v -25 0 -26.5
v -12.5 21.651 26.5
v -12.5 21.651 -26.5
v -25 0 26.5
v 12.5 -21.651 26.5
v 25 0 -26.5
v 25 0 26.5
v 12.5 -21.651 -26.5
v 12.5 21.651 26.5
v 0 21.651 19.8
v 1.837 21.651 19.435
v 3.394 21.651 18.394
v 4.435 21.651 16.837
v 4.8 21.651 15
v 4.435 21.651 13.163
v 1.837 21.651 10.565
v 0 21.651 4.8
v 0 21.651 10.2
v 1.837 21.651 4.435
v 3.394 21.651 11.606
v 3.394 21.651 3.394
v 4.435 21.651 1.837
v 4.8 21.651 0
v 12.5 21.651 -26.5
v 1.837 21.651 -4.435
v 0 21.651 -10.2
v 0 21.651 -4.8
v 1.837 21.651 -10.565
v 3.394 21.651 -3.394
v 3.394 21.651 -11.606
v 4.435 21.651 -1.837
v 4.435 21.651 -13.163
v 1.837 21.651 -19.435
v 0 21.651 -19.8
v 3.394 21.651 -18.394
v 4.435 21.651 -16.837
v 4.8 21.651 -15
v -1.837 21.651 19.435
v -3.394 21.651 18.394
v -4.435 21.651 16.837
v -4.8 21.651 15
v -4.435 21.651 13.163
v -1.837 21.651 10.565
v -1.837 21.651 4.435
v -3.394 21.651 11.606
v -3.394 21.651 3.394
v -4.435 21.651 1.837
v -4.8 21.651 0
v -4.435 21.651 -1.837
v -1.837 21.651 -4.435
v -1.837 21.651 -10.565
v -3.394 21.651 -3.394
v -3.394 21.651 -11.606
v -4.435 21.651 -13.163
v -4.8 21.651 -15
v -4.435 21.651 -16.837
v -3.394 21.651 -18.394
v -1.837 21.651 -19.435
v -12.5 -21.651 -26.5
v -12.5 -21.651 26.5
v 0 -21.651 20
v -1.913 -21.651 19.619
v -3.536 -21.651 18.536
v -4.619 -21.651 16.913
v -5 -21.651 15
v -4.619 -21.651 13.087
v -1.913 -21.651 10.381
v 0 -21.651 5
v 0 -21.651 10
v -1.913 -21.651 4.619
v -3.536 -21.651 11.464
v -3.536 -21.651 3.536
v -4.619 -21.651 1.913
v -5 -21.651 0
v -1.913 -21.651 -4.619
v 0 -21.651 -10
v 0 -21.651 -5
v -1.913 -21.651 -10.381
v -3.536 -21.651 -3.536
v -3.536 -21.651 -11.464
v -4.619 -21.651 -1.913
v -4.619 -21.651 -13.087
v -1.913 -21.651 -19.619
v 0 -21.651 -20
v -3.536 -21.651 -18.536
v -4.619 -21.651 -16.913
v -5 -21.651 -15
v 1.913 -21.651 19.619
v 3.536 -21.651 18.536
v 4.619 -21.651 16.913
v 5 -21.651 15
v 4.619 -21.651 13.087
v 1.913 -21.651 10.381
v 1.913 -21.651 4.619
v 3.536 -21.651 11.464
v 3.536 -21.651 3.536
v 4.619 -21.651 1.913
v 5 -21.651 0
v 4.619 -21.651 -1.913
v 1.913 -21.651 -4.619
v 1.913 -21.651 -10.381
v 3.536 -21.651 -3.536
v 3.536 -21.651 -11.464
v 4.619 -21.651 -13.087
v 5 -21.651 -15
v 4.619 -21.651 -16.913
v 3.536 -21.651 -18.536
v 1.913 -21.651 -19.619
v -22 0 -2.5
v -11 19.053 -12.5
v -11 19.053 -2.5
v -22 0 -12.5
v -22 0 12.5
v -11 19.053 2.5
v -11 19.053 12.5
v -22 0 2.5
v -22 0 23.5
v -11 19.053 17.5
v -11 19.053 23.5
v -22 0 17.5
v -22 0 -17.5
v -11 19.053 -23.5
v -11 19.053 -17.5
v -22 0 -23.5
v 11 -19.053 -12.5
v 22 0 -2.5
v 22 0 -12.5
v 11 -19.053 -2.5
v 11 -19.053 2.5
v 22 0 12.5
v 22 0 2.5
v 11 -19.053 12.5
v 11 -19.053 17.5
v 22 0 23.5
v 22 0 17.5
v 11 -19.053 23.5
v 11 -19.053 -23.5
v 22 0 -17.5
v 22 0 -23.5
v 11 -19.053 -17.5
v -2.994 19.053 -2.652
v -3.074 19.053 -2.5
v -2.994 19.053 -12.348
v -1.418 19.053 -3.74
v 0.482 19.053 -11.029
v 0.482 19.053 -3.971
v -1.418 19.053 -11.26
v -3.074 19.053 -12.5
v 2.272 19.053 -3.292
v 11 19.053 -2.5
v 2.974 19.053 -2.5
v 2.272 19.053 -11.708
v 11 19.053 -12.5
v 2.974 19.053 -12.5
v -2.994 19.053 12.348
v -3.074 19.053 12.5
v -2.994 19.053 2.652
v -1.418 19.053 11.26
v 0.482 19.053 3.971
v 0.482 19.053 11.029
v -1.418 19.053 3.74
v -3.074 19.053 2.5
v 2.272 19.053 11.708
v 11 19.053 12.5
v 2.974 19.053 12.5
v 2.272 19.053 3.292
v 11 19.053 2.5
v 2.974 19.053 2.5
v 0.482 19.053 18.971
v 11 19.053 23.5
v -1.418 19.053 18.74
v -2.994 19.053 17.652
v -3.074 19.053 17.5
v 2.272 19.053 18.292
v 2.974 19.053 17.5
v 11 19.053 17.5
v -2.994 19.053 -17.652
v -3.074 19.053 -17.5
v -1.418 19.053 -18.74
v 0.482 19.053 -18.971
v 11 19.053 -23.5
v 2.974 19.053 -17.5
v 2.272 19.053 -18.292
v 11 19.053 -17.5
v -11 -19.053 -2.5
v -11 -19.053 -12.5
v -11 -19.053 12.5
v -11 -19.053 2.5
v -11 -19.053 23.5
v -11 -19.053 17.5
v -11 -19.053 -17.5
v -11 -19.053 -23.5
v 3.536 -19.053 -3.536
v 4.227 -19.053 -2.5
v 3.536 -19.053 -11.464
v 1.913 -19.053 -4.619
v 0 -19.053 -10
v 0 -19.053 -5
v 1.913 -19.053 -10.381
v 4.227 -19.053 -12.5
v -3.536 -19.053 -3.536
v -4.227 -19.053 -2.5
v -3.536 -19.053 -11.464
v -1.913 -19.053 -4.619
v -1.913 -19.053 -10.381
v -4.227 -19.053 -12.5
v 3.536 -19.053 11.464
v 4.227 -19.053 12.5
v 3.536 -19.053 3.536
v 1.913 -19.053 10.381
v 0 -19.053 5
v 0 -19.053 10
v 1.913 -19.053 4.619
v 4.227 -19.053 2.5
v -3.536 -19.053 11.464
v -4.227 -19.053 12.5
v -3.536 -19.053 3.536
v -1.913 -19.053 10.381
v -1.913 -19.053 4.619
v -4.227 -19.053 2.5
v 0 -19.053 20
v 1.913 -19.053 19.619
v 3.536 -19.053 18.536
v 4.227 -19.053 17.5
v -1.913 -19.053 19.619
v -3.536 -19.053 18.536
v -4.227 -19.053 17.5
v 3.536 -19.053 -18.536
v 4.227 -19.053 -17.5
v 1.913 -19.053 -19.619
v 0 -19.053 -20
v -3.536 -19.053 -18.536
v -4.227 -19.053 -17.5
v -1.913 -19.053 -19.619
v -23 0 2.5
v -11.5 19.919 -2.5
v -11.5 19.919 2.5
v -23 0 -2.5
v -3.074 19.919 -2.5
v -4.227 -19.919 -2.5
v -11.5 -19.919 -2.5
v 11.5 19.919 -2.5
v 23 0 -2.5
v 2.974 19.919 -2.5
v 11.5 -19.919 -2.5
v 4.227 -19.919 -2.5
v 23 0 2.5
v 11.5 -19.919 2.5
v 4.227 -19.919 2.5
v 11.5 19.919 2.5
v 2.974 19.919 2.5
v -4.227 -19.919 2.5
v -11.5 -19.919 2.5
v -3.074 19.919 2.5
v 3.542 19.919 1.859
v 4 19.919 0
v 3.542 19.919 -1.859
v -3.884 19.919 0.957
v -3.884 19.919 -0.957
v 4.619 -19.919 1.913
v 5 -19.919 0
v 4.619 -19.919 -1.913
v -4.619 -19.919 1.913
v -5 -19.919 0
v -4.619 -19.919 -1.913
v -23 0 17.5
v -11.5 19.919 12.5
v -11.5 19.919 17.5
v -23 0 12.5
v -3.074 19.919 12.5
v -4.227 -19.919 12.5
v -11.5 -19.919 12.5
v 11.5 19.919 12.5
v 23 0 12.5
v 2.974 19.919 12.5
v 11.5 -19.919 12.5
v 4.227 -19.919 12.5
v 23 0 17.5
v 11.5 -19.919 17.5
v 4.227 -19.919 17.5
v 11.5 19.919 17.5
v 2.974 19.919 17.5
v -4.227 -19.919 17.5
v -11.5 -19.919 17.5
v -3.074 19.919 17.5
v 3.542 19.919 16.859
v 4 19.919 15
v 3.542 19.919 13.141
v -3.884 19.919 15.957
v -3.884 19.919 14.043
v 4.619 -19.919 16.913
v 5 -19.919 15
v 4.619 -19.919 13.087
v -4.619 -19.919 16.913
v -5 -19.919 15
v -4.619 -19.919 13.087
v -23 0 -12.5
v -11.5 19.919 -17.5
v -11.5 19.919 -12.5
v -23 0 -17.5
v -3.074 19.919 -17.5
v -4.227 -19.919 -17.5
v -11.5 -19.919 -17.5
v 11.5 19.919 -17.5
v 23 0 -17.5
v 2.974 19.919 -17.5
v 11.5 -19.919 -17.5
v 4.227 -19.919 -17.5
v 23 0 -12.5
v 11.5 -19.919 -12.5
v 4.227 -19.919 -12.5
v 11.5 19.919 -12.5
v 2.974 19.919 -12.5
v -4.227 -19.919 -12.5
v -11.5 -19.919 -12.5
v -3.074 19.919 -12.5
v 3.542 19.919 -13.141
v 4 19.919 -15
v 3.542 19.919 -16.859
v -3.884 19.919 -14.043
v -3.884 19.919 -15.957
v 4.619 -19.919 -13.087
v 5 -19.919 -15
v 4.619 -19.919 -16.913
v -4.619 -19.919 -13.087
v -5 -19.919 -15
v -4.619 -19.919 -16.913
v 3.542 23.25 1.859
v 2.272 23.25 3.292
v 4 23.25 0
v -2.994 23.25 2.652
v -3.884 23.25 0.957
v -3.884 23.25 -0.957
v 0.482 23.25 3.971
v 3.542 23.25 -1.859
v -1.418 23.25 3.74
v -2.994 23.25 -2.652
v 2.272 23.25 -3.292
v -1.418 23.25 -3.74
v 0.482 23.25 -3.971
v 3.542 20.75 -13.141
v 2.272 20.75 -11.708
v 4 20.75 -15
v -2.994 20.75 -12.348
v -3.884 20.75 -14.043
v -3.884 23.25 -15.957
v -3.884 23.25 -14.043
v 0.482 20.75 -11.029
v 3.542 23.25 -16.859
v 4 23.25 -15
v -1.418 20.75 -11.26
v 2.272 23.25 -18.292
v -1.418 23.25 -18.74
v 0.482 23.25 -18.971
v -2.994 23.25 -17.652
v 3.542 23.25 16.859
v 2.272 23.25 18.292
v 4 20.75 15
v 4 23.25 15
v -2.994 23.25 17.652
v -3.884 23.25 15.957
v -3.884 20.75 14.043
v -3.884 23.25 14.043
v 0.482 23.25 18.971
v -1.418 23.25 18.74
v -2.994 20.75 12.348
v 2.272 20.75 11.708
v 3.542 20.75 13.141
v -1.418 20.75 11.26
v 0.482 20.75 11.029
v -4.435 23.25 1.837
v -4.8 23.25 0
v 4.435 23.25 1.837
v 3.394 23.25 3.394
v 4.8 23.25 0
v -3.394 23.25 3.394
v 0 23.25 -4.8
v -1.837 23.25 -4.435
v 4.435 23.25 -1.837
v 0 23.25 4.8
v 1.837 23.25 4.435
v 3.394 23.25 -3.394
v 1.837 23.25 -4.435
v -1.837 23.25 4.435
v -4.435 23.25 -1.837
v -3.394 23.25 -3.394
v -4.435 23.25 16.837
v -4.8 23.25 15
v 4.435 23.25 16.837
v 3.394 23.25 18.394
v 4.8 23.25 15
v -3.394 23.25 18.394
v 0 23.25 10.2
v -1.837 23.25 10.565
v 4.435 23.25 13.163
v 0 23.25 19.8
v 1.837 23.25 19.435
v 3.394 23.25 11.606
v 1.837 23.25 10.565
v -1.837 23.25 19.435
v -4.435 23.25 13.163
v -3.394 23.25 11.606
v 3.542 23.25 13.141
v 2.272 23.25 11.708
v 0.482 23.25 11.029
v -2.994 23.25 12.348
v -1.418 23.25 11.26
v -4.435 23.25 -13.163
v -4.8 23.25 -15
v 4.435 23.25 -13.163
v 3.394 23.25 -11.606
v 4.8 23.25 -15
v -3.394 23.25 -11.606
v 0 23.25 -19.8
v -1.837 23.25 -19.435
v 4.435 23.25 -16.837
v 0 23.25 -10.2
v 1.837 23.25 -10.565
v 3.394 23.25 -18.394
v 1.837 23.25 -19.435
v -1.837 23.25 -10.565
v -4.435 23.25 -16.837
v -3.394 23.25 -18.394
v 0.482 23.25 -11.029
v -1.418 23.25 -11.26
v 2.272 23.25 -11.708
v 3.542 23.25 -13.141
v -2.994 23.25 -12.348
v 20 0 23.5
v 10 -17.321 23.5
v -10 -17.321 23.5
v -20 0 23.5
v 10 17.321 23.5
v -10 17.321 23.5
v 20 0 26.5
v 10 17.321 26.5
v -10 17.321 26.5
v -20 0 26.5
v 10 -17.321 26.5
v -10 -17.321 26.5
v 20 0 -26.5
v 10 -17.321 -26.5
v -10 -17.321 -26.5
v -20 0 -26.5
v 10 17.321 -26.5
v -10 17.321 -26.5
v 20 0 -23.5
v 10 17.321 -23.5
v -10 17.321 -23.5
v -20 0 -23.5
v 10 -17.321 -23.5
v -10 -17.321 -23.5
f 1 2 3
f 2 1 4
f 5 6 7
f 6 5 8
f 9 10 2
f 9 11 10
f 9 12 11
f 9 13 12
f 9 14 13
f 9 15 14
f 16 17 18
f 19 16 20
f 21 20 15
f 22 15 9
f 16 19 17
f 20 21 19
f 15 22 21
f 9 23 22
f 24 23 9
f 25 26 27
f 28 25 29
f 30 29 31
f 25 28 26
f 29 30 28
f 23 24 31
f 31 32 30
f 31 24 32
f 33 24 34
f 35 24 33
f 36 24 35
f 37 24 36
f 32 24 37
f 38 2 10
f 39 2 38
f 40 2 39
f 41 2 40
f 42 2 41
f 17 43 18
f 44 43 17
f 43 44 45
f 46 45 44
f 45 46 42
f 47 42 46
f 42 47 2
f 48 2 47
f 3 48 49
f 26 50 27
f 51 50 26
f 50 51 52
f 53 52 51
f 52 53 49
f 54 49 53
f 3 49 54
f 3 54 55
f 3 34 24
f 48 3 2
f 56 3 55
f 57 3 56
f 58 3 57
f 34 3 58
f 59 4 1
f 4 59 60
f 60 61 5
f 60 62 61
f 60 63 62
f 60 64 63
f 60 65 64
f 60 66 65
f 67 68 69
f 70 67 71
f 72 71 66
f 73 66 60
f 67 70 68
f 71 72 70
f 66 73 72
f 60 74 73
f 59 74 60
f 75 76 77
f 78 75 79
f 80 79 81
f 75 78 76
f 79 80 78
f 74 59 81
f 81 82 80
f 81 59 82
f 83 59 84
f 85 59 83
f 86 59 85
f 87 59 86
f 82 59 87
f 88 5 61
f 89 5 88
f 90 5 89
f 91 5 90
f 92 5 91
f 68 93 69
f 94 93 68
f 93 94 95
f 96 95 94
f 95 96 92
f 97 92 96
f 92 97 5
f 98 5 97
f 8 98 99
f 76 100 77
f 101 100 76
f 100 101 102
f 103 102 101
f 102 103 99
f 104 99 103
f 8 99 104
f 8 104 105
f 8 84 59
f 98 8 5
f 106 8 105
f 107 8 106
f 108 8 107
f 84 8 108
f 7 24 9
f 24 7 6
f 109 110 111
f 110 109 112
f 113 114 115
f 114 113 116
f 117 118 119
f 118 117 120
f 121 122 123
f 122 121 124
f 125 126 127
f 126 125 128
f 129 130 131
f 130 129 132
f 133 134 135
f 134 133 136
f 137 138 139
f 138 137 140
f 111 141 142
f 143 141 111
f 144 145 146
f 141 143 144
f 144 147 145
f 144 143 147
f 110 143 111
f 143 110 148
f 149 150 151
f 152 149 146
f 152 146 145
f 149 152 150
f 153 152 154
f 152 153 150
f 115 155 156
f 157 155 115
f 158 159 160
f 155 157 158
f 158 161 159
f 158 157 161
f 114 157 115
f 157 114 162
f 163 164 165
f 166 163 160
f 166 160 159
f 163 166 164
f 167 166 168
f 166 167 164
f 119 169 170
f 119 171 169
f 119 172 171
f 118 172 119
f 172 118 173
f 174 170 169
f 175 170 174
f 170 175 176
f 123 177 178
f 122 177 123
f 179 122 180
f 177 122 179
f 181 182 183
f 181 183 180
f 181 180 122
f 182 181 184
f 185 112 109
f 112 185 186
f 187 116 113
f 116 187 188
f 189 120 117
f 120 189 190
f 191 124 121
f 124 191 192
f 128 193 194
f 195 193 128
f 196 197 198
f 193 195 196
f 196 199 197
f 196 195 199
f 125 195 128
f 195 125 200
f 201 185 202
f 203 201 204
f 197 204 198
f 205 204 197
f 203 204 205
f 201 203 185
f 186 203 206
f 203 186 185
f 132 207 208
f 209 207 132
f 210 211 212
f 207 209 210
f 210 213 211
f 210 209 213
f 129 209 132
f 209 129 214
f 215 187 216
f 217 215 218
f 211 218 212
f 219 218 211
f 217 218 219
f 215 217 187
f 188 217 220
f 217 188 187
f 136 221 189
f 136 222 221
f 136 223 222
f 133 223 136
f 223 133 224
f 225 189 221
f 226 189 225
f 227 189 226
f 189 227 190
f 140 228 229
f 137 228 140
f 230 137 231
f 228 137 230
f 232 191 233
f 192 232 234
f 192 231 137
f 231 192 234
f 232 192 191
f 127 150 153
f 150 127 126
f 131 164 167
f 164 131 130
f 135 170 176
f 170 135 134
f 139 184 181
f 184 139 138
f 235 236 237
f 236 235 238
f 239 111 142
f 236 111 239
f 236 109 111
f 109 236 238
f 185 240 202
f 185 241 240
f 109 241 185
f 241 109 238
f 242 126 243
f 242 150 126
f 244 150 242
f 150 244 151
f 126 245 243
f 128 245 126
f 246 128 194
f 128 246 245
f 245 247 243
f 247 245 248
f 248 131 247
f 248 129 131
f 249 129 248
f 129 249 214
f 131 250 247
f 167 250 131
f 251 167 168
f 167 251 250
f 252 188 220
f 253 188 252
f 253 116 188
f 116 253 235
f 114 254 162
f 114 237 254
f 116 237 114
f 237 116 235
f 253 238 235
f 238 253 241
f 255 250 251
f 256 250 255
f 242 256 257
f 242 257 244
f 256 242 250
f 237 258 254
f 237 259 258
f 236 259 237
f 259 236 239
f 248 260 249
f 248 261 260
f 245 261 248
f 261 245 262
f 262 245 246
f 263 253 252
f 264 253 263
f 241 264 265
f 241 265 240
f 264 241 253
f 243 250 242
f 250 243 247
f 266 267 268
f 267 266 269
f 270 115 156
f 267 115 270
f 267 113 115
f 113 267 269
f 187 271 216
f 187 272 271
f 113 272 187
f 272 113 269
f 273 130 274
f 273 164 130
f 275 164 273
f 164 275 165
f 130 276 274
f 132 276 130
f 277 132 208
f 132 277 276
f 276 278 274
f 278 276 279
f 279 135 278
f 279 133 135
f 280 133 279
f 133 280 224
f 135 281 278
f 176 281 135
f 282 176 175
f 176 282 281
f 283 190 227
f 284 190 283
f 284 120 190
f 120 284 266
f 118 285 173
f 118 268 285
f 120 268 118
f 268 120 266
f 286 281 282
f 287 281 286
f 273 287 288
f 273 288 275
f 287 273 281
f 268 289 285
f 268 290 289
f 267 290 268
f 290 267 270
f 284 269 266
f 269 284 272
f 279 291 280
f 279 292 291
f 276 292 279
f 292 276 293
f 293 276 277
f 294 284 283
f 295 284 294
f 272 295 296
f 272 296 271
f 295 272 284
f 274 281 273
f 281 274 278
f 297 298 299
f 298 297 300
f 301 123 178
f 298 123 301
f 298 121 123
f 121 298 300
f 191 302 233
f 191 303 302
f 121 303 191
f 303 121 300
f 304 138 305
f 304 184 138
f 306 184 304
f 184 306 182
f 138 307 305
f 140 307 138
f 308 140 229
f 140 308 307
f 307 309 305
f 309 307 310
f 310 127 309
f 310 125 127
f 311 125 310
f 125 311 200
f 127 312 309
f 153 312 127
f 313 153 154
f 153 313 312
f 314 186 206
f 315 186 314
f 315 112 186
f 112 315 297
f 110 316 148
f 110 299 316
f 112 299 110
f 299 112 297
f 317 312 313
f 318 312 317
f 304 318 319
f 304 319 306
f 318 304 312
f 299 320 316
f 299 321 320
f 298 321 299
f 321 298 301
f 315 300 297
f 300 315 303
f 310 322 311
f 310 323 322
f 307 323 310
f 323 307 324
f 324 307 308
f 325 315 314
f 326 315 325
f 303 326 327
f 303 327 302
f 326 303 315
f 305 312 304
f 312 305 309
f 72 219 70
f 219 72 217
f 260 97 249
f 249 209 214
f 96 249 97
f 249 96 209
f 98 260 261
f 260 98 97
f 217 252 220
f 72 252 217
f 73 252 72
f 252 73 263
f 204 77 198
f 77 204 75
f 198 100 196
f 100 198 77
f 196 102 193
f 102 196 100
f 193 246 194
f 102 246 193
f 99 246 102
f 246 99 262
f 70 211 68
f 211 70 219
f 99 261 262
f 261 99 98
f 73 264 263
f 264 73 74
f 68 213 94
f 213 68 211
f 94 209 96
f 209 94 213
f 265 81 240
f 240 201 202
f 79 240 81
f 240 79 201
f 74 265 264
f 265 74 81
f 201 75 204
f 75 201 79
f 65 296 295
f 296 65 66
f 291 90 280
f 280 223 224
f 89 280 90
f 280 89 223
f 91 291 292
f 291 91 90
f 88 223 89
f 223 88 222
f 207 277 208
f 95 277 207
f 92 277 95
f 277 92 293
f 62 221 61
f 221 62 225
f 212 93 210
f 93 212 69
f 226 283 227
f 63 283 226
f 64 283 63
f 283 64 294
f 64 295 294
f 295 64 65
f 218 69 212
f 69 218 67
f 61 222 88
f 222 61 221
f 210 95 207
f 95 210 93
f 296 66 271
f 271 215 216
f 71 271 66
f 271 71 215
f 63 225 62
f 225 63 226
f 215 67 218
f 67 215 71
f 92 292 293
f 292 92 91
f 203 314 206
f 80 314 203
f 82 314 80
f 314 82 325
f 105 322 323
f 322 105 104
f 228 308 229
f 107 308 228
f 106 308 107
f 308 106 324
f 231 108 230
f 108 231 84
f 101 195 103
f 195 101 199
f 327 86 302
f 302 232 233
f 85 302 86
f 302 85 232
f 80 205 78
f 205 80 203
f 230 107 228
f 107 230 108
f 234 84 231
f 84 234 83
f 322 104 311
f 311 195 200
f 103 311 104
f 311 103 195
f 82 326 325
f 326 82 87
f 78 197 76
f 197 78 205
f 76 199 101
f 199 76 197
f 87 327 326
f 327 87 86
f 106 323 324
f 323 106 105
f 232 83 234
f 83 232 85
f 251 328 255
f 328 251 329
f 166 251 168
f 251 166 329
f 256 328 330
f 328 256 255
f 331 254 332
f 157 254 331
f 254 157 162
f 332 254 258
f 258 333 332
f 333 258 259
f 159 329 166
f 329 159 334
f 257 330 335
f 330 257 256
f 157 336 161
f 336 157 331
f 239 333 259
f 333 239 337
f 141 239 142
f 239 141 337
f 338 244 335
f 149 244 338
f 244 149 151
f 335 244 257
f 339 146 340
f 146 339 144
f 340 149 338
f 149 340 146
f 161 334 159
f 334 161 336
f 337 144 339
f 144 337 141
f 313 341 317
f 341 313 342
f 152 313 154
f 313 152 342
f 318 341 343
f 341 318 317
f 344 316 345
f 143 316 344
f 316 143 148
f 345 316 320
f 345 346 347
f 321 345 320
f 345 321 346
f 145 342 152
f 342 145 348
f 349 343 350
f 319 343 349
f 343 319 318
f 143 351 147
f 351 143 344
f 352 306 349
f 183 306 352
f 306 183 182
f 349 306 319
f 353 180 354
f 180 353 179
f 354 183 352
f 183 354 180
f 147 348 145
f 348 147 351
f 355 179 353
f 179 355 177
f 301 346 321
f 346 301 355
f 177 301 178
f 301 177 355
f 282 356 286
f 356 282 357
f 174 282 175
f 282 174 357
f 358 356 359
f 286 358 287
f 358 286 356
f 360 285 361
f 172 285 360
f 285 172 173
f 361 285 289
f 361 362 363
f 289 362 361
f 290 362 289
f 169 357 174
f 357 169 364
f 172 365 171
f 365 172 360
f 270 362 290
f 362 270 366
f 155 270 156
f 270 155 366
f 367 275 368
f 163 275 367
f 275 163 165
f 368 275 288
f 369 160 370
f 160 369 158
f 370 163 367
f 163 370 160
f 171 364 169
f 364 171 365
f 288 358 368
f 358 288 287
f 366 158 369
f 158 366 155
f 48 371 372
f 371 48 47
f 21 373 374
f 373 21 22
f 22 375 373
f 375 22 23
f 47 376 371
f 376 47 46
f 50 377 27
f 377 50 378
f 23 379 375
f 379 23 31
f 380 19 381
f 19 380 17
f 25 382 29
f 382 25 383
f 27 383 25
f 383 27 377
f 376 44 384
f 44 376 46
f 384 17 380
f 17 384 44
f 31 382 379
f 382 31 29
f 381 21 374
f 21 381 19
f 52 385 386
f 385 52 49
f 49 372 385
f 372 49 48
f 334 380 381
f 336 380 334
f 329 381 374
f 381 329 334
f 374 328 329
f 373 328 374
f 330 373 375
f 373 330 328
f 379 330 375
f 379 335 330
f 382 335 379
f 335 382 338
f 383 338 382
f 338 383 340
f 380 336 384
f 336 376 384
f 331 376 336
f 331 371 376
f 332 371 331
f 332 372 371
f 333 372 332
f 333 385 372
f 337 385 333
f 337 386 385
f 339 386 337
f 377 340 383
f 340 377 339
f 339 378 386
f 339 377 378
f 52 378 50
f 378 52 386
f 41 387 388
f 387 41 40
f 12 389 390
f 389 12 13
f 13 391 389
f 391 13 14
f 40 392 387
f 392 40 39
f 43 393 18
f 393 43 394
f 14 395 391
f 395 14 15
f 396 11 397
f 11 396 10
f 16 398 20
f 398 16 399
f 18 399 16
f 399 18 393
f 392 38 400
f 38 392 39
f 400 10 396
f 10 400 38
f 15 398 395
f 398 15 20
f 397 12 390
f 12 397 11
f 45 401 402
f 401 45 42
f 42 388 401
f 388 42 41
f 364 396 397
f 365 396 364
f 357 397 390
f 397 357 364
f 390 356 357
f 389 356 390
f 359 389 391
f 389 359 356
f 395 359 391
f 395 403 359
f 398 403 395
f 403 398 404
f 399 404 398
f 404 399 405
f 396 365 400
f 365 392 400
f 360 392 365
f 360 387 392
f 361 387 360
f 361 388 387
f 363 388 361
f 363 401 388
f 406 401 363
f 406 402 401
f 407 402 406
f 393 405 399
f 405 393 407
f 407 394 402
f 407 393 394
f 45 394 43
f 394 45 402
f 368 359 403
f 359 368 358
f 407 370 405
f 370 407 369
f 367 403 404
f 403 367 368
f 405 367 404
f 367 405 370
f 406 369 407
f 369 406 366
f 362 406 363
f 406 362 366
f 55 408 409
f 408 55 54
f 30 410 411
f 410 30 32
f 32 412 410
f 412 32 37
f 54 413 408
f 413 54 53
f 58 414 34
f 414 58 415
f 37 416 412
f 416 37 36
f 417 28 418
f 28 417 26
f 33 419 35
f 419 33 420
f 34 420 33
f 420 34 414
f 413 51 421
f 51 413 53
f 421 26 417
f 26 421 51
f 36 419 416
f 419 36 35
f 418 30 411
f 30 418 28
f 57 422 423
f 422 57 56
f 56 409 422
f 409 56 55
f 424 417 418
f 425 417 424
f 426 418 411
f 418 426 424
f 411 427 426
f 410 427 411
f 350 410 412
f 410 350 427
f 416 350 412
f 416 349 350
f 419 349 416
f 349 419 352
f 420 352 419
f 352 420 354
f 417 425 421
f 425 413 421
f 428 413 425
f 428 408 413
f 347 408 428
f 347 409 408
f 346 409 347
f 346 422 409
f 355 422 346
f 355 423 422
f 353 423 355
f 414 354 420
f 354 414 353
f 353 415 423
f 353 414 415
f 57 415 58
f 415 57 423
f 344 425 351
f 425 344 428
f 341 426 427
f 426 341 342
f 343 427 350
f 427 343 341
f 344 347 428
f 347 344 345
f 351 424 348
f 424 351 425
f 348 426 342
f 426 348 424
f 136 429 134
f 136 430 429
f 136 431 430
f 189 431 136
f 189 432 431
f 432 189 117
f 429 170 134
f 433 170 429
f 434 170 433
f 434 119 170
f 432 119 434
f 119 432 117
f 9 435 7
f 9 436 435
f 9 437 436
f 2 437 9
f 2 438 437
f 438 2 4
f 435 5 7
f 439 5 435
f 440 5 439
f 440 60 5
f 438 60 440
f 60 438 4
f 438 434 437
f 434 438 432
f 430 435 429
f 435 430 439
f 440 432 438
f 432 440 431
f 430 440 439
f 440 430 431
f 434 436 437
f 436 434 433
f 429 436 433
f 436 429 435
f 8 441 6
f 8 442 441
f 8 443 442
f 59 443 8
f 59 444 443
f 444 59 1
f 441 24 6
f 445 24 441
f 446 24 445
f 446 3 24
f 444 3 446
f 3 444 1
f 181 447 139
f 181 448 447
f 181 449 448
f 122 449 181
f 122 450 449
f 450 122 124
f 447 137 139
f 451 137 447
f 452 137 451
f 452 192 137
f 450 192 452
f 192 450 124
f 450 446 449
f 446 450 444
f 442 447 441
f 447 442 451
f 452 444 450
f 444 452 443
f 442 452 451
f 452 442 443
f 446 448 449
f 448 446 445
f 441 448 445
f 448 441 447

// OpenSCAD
union(){
  difference(){
    difference(){
      linear_extrude(height=50, center=true){
        circle(25, $fn=6);
      }
      linear_extrude(height=52, center=true){
        circle(22, $fn=6);
      }
    }
    
    difference(){
      linear_extrude(height=5, center=true){
        circle(23, $fn=6);
      }
      linear_extrude(height=6, center=true){
        circle(20, $fn=6);
      }
    }
    
    translate([0, 0, 15]){
      difference(){
        linear_extrude(height=5, center=true){
          circle(23, $fn=6);
        }
        linear_extrude(height=6, center=true){
          circle(20, $fn=6);
        }
      }
    }
    
    translate([0, 0, -15]){
      difference(){
        linear_extrude(height=5, center=true){
          circle(23, $fn=6);
        }
        linear_extrude(height=6, center=true){
          circle(20, $fn=6);
        }
      }
    }
    
    translate([0, -20, 0]){
      rotate([90, 0, 0]){
        cylinder(h=12, r=5, center=true);
      }
    }
    
    translate([0, -20, 15]){
      rotate([90, 0, 0]){
        cylinder(h=12, r=5, center=true);
      }
    }

    translate([0, -20, -15]){
      rotate([90, 0, 0]){
        cylinder(h=12, r=5, center=true);
      }
    }
    
    translate([0, 20, 0]){
      rotate([90, 0, 0]){
        cylinder(h=12, r=4, center=true);
      }
    }
    
    translate([0, 20, -15]){
      rotate([90, 0, 0]){
        cylinder(h=12, r=4, center=true);
      }
    }
    
    translate([0, 20, 15]){
      rotate([90, 0, 0]){
        cylinder(h=12, r=4, center=true);
      }
    }
    
    translate([0, 39, 0]){
      cube(size=[5, 4, 35], center=true);
    }
  }

  translate([0, 22, 0]){
    rotate([90, 0, 0]){
      difference(){
        cylinder(h=2.5, r=4.8, center=true);
        cylinder(h=11, r=4, center=true);
      }
    }
  }

  translate([0, 22, 15]){
    rotate([90, 0, 0]){
      difference(){
        cylinder(h=2.5, r=4.8, center=true);
        cylinder(h=11, r=4, center=true);
      }
    }
  }

  translate([0, 22, -15]){
    rotate([90, 0, 0]){
      difference(){
        cylinder(h=2.5, r=4.8, center=true);
        cylinder(h=11, r=4, center=true);
      }
    }
  }
  
  translate([0, 0, 25]){
    difference(){
      linear_extrude(height=3, center=true){
        circle(25, $fn=6);
      }
      linear_extrude(height=4, center=true){
        circle(20, $fn=6);
      }
    }
  }
  
  translate([0, 0, -25]){
    difference(){
      linear_extrude(height=3, center=true){
        circle(25, $fn=6);
      }
      linear_extrude(height=4, center=true){
        circle(20, $fn=6);
      }
    }
  }
}
